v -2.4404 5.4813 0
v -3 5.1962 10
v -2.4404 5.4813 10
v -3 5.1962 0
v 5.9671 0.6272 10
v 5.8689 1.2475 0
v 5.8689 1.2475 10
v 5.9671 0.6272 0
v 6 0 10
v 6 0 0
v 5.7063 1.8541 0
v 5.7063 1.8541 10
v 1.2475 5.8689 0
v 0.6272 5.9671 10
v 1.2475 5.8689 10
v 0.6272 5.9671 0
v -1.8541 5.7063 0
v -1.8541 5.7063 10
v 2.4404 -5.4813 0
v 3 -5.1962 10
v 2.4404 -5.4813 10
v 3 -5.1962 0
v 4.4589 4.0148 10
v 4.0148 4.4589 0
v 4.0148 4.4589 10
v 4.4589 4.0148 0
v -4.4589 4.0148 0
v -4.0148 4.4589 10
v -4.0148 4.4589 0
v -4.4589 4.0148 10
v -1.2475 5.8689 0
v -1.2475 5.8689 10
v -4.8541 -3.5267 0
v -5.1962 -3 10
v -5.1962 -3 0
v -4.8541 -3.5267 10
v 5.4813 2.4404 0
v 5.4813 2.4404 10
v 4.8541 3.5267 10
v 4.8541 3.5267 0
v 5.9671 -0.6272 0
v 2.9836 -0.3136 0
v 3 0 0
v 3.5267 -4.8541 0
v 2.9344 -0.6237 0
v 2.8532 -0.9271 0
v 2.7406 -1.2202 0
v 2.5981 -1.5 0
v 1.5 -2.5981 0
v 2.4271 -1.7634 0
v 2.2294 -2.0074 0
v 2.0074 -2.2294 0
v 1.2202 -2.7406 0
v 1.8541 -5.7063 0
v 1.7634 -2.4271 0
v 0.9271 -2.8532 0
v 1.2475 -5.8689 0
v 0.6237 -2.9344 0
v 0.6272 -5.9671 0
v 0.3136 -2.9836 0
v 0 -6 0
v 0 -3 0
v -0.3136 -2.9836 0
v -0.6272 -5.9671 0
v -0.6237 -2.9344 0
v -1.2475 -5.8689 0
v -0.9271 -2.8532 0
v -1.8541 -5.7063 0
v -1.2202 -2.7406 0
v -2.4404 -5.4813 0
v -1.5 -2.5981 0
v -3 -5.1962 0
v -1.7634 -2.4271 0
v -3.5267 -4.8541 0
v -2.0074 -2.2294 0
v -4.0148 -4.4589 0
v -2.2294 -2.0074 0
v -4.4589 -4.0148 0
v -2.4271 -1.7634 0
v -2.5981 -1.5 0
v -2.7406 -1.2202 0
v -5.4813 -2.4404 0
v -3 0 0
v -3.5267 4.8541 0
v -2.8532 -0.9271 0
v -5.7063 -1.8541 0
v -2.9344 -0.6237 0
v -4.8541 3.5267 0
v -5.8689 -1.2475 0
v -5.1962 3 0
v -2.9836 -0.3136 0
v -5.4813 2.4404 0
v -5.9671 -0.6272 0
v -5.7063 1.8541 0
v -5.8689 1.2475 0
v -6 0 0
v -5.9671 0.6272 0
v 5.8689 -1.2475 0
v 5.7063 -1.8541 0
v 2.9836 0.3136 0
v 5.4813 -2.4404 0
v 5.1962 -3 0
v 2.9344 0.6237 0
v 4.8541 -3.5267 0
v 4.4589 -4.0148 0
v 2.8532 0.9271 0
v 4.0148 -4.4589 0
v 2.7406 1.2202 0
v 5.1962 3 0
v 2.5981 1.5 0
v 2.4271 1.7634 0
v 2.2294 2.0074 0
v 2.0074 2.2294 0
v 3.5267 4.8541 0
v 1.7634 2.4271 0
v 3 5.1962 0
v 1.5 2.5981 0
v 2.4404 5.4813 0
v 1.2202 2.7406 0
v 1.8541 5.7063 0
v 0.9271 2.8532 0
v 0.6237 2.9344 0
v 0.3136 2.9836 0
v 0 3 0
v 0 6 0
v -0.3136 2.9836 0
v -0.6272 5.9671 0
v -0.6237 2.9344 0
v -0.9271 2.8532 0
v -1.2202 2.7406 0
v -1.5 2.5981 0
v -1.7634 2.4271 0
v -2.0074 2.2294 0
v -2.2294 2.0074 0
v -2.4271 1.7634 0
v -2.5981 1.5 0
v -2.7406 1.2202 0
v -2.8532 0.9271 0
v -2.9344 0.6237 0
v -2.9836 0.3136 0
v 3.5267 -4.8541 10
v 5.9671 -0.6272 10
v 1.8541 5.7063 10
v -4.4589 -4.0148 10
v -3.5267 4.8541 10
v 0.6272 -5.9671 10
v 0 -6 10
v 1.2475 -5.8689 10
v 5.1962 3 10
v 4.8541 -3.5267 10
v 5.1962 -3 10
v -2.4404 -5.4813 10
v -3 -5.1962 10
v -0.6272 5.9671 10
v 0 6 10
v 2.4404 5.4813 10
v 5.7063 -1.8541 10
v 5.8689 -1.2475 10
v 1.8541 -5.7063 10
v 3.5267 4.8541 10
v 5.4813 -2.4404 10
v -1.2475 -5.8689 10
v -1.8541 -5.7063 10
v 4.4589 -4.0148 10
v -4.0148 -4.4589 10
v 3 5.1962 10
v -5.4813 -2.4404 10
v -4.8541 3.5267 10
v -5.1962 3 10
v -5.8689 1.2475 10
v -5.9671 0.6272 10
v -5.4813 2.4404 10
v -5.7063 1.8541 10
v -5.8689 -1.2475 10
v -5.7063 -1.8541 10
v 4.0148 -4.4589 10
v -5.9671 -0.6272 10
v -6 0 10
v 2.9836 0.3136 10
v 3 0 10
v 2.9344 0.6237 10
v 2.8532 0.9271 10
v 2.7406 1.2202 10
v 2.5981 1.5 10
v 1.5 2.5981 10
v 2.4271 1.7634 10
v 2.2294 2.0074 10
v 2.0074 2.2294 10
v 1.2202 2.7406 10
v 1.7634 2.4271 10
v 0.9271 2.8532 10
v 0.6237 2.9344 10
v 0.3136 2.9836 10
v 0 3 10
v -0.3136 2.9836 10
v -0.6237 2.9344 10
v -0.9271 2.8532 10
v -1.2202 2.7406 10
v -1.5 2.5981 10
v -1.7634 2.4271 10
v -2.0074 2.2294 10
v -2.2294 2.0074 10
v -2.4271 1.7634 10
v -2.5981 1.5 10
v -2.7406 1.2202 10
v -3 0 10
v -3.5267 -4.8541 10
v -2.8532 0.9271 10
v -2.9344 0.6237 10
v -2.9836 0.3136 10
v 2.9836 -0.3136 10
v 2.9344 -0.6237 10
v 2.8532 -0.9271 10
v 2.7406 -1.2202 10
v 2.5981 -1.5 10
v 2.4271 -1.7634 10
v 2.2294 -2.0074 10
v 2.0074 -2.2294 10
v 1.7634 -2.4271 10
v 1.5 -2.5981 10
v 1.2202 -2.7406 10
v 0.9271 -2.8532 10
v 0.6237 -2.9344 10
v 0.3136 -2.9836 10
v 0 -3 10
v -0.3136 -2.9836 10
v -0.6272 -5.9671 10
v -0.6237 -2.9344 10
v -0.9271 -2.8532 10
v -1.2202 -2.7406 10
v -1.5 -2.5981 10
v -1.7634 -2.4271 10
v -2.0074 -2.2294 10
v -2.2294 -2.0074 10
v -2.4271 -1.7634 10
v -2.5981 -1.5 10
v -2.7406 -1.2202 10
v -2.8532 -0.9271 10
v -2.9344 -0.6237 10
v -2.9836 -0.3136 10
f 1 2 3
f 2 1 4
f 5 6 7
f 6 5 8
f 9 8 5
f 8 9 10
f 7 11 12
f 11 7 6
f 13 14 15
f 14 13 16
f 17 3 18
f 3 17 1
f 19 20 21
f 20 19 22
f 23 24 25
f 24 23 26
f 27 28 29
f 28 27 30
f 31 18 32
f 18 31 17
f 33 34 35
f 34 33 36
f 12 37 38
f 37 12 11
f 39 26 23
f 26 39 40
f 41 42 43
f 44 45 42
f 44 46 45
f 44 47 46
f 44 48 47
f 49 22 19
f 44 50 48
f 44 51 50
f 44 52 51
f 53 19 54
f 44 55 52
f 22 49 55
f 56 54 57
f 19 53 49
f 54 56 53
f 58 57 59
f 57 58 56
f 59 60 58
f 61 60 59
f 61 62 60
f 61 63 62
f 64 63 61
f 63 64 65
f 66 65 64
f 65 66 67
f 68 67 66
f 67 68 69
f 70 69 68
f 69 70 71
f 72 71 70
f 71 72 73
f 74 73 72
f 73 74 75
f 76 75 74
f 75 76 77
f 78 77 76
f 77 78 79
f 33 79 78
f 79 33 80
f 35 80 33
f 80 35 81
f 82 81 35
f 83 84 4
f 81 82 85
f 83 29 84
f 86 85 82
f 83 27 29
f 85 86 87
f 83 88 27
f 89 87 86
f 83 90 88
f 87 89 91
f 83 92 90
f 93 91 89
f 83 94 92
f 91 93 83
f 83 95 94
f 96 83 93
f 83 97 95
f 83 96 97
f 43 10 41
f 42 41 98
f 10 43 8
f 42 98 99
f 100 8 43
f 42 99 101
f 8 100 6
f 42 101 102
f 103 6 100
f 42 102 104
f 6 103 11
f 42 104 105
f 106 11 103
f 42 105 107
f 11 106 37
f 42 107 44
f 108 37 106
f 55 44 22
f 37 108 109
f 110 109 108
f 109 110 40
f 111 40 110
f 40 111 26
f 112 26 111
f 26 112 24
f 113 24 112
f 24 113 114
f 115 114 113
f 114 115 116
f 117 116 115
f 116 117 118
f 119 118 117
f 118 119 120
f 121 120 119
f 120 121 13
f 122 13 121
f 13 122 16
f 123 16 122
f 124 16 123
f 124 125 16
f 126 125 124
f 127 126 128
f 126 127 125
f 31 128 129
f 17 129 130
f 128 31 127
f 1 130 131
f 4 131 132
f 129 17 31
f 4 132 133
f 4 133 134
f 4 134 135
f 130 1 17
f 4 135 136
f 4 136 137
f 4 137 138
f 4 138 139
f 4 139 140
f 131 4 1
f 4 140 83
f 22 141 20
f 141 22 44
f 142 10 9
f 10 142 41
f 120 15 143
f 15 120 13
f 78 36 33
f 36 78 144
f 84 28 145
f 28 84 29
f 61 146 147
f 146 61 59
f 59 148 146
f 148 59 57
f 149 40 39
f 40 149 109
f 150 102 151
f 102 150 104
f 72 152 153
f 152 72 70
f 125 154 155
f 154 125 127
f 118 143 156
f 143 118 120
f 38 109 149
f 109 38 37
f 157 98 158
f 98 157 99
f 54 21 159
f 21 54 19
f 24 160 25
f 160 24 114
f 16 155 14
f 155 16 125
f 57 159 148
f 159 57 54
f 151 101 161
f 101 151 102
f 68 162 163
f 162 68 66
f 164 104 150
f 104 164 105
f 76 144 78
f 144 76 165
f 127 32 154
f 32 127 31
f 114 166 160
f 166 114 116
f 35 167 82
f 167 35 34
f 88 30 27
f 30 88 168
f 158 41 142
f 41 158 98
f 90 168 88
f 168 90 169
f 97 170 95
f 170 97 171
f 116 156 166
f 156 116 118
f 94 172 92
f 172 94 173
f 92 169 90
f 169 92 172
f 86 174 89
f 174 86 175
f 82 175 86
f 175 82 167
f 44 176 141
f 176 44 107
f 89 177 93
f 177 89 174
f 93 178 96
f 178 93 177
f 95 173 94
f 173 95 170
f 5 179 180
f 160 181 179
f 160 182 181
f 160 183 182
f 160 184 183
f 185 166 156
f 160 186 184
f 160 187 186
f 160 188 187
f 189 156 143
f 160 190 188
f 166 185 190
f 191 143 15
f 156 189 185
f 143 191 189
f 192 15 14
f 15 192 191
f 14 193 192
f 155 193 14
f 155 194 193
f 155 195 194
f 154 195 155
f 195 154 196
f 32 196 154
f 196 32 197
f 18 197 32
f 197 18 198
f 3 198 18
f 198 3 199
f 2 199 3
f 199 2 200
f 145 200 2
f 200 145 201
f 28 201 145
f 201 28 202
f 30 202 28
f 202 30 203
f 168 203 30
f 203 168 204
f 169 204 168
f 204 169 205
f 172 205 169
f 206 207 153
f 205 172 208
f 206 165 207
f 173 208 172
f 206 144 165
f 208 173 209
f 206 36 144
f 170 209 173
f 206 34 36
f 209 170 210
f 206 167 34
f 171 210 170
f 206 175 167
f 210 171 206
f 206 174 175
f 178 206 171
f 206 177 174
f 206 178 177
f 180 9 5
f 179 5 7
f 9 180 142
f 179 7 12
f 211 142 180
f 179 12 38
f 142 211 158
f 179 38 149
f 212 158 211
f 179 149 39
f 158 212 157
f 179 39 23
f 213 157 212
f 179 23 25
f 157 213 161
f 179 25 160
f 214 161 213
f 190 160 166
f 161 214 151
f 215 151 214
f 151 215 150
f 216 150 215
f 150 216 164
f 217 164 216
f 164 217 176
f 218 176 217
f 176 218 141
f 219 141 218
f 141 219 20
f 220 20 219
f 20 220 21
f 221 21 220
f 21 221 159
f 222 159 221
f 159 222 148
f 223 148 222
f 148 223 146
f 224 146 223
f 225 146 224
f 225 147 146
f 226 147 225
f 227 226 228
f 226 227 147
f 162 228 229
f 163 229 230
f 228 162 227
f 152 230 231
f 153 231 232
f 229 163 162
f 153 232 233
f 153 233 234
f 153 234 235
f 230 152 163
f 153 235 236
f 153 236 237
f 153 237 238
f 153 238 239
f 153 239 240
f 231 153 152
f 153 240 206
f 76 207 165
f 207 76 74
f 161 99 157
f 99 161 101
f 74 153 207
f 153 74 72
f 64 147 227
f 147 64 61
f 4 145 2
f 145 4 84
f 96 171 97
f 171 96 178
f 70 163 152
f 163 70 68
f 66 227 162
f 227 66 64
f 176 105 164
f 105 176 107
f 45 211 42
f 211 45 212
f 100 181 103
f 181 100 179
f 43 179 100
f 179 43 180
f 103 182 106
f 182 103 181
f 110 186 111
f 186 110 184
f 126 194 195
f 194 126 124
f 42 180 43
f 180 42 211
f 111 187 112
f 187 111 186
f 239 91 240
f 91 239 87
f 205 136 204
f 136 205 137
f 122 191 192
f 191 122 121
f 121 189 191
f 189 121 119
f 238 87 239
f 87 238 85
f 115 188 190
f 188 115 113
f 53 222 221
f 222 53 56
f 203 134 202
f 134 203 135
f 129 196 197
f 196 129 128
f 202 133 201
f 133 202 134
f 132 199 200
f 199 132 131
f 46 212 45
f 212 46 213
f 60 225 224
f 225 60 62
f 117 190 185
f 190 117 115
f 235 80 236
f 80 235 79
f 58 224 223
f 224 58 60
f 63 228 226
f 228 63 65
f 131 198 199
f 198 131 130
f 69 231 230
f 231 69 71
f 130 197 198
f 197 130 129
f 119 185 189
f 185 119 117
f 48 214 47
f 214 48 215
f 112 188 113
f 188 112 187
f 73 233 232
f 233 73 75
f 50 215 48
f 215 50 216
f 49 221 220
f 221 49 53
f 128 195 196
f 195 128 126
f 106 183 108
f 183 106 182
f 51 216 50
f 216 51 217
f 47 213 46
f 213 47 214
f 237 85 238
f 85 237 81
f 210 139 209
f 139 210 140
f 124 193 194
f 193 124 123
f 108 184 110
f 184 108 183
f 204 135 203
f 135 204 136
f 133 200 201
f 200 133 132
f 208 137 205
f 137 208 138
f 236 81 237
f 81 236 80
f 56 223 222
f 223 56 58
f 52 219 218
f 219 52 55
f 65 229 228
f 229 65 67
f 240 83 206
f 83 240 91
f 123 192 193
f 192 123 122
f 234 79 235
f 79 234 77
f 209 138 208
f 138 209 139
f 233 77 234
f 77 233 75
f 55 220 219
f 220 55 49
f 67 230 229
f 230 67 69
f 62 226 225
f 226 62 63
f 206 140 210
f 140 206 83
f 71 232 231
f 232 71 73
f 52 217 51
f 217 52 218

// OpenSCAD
// Axle spacer tube.
$fn = 60;
eps = 0.02;
inner_d = 6;
outer_d = 12;
length = 10;
difference() { cylinder(d = outer_d, h = length); translate([0,0,-eps]) cylinder(d = inner_d, h = length + 2 * eps); }
